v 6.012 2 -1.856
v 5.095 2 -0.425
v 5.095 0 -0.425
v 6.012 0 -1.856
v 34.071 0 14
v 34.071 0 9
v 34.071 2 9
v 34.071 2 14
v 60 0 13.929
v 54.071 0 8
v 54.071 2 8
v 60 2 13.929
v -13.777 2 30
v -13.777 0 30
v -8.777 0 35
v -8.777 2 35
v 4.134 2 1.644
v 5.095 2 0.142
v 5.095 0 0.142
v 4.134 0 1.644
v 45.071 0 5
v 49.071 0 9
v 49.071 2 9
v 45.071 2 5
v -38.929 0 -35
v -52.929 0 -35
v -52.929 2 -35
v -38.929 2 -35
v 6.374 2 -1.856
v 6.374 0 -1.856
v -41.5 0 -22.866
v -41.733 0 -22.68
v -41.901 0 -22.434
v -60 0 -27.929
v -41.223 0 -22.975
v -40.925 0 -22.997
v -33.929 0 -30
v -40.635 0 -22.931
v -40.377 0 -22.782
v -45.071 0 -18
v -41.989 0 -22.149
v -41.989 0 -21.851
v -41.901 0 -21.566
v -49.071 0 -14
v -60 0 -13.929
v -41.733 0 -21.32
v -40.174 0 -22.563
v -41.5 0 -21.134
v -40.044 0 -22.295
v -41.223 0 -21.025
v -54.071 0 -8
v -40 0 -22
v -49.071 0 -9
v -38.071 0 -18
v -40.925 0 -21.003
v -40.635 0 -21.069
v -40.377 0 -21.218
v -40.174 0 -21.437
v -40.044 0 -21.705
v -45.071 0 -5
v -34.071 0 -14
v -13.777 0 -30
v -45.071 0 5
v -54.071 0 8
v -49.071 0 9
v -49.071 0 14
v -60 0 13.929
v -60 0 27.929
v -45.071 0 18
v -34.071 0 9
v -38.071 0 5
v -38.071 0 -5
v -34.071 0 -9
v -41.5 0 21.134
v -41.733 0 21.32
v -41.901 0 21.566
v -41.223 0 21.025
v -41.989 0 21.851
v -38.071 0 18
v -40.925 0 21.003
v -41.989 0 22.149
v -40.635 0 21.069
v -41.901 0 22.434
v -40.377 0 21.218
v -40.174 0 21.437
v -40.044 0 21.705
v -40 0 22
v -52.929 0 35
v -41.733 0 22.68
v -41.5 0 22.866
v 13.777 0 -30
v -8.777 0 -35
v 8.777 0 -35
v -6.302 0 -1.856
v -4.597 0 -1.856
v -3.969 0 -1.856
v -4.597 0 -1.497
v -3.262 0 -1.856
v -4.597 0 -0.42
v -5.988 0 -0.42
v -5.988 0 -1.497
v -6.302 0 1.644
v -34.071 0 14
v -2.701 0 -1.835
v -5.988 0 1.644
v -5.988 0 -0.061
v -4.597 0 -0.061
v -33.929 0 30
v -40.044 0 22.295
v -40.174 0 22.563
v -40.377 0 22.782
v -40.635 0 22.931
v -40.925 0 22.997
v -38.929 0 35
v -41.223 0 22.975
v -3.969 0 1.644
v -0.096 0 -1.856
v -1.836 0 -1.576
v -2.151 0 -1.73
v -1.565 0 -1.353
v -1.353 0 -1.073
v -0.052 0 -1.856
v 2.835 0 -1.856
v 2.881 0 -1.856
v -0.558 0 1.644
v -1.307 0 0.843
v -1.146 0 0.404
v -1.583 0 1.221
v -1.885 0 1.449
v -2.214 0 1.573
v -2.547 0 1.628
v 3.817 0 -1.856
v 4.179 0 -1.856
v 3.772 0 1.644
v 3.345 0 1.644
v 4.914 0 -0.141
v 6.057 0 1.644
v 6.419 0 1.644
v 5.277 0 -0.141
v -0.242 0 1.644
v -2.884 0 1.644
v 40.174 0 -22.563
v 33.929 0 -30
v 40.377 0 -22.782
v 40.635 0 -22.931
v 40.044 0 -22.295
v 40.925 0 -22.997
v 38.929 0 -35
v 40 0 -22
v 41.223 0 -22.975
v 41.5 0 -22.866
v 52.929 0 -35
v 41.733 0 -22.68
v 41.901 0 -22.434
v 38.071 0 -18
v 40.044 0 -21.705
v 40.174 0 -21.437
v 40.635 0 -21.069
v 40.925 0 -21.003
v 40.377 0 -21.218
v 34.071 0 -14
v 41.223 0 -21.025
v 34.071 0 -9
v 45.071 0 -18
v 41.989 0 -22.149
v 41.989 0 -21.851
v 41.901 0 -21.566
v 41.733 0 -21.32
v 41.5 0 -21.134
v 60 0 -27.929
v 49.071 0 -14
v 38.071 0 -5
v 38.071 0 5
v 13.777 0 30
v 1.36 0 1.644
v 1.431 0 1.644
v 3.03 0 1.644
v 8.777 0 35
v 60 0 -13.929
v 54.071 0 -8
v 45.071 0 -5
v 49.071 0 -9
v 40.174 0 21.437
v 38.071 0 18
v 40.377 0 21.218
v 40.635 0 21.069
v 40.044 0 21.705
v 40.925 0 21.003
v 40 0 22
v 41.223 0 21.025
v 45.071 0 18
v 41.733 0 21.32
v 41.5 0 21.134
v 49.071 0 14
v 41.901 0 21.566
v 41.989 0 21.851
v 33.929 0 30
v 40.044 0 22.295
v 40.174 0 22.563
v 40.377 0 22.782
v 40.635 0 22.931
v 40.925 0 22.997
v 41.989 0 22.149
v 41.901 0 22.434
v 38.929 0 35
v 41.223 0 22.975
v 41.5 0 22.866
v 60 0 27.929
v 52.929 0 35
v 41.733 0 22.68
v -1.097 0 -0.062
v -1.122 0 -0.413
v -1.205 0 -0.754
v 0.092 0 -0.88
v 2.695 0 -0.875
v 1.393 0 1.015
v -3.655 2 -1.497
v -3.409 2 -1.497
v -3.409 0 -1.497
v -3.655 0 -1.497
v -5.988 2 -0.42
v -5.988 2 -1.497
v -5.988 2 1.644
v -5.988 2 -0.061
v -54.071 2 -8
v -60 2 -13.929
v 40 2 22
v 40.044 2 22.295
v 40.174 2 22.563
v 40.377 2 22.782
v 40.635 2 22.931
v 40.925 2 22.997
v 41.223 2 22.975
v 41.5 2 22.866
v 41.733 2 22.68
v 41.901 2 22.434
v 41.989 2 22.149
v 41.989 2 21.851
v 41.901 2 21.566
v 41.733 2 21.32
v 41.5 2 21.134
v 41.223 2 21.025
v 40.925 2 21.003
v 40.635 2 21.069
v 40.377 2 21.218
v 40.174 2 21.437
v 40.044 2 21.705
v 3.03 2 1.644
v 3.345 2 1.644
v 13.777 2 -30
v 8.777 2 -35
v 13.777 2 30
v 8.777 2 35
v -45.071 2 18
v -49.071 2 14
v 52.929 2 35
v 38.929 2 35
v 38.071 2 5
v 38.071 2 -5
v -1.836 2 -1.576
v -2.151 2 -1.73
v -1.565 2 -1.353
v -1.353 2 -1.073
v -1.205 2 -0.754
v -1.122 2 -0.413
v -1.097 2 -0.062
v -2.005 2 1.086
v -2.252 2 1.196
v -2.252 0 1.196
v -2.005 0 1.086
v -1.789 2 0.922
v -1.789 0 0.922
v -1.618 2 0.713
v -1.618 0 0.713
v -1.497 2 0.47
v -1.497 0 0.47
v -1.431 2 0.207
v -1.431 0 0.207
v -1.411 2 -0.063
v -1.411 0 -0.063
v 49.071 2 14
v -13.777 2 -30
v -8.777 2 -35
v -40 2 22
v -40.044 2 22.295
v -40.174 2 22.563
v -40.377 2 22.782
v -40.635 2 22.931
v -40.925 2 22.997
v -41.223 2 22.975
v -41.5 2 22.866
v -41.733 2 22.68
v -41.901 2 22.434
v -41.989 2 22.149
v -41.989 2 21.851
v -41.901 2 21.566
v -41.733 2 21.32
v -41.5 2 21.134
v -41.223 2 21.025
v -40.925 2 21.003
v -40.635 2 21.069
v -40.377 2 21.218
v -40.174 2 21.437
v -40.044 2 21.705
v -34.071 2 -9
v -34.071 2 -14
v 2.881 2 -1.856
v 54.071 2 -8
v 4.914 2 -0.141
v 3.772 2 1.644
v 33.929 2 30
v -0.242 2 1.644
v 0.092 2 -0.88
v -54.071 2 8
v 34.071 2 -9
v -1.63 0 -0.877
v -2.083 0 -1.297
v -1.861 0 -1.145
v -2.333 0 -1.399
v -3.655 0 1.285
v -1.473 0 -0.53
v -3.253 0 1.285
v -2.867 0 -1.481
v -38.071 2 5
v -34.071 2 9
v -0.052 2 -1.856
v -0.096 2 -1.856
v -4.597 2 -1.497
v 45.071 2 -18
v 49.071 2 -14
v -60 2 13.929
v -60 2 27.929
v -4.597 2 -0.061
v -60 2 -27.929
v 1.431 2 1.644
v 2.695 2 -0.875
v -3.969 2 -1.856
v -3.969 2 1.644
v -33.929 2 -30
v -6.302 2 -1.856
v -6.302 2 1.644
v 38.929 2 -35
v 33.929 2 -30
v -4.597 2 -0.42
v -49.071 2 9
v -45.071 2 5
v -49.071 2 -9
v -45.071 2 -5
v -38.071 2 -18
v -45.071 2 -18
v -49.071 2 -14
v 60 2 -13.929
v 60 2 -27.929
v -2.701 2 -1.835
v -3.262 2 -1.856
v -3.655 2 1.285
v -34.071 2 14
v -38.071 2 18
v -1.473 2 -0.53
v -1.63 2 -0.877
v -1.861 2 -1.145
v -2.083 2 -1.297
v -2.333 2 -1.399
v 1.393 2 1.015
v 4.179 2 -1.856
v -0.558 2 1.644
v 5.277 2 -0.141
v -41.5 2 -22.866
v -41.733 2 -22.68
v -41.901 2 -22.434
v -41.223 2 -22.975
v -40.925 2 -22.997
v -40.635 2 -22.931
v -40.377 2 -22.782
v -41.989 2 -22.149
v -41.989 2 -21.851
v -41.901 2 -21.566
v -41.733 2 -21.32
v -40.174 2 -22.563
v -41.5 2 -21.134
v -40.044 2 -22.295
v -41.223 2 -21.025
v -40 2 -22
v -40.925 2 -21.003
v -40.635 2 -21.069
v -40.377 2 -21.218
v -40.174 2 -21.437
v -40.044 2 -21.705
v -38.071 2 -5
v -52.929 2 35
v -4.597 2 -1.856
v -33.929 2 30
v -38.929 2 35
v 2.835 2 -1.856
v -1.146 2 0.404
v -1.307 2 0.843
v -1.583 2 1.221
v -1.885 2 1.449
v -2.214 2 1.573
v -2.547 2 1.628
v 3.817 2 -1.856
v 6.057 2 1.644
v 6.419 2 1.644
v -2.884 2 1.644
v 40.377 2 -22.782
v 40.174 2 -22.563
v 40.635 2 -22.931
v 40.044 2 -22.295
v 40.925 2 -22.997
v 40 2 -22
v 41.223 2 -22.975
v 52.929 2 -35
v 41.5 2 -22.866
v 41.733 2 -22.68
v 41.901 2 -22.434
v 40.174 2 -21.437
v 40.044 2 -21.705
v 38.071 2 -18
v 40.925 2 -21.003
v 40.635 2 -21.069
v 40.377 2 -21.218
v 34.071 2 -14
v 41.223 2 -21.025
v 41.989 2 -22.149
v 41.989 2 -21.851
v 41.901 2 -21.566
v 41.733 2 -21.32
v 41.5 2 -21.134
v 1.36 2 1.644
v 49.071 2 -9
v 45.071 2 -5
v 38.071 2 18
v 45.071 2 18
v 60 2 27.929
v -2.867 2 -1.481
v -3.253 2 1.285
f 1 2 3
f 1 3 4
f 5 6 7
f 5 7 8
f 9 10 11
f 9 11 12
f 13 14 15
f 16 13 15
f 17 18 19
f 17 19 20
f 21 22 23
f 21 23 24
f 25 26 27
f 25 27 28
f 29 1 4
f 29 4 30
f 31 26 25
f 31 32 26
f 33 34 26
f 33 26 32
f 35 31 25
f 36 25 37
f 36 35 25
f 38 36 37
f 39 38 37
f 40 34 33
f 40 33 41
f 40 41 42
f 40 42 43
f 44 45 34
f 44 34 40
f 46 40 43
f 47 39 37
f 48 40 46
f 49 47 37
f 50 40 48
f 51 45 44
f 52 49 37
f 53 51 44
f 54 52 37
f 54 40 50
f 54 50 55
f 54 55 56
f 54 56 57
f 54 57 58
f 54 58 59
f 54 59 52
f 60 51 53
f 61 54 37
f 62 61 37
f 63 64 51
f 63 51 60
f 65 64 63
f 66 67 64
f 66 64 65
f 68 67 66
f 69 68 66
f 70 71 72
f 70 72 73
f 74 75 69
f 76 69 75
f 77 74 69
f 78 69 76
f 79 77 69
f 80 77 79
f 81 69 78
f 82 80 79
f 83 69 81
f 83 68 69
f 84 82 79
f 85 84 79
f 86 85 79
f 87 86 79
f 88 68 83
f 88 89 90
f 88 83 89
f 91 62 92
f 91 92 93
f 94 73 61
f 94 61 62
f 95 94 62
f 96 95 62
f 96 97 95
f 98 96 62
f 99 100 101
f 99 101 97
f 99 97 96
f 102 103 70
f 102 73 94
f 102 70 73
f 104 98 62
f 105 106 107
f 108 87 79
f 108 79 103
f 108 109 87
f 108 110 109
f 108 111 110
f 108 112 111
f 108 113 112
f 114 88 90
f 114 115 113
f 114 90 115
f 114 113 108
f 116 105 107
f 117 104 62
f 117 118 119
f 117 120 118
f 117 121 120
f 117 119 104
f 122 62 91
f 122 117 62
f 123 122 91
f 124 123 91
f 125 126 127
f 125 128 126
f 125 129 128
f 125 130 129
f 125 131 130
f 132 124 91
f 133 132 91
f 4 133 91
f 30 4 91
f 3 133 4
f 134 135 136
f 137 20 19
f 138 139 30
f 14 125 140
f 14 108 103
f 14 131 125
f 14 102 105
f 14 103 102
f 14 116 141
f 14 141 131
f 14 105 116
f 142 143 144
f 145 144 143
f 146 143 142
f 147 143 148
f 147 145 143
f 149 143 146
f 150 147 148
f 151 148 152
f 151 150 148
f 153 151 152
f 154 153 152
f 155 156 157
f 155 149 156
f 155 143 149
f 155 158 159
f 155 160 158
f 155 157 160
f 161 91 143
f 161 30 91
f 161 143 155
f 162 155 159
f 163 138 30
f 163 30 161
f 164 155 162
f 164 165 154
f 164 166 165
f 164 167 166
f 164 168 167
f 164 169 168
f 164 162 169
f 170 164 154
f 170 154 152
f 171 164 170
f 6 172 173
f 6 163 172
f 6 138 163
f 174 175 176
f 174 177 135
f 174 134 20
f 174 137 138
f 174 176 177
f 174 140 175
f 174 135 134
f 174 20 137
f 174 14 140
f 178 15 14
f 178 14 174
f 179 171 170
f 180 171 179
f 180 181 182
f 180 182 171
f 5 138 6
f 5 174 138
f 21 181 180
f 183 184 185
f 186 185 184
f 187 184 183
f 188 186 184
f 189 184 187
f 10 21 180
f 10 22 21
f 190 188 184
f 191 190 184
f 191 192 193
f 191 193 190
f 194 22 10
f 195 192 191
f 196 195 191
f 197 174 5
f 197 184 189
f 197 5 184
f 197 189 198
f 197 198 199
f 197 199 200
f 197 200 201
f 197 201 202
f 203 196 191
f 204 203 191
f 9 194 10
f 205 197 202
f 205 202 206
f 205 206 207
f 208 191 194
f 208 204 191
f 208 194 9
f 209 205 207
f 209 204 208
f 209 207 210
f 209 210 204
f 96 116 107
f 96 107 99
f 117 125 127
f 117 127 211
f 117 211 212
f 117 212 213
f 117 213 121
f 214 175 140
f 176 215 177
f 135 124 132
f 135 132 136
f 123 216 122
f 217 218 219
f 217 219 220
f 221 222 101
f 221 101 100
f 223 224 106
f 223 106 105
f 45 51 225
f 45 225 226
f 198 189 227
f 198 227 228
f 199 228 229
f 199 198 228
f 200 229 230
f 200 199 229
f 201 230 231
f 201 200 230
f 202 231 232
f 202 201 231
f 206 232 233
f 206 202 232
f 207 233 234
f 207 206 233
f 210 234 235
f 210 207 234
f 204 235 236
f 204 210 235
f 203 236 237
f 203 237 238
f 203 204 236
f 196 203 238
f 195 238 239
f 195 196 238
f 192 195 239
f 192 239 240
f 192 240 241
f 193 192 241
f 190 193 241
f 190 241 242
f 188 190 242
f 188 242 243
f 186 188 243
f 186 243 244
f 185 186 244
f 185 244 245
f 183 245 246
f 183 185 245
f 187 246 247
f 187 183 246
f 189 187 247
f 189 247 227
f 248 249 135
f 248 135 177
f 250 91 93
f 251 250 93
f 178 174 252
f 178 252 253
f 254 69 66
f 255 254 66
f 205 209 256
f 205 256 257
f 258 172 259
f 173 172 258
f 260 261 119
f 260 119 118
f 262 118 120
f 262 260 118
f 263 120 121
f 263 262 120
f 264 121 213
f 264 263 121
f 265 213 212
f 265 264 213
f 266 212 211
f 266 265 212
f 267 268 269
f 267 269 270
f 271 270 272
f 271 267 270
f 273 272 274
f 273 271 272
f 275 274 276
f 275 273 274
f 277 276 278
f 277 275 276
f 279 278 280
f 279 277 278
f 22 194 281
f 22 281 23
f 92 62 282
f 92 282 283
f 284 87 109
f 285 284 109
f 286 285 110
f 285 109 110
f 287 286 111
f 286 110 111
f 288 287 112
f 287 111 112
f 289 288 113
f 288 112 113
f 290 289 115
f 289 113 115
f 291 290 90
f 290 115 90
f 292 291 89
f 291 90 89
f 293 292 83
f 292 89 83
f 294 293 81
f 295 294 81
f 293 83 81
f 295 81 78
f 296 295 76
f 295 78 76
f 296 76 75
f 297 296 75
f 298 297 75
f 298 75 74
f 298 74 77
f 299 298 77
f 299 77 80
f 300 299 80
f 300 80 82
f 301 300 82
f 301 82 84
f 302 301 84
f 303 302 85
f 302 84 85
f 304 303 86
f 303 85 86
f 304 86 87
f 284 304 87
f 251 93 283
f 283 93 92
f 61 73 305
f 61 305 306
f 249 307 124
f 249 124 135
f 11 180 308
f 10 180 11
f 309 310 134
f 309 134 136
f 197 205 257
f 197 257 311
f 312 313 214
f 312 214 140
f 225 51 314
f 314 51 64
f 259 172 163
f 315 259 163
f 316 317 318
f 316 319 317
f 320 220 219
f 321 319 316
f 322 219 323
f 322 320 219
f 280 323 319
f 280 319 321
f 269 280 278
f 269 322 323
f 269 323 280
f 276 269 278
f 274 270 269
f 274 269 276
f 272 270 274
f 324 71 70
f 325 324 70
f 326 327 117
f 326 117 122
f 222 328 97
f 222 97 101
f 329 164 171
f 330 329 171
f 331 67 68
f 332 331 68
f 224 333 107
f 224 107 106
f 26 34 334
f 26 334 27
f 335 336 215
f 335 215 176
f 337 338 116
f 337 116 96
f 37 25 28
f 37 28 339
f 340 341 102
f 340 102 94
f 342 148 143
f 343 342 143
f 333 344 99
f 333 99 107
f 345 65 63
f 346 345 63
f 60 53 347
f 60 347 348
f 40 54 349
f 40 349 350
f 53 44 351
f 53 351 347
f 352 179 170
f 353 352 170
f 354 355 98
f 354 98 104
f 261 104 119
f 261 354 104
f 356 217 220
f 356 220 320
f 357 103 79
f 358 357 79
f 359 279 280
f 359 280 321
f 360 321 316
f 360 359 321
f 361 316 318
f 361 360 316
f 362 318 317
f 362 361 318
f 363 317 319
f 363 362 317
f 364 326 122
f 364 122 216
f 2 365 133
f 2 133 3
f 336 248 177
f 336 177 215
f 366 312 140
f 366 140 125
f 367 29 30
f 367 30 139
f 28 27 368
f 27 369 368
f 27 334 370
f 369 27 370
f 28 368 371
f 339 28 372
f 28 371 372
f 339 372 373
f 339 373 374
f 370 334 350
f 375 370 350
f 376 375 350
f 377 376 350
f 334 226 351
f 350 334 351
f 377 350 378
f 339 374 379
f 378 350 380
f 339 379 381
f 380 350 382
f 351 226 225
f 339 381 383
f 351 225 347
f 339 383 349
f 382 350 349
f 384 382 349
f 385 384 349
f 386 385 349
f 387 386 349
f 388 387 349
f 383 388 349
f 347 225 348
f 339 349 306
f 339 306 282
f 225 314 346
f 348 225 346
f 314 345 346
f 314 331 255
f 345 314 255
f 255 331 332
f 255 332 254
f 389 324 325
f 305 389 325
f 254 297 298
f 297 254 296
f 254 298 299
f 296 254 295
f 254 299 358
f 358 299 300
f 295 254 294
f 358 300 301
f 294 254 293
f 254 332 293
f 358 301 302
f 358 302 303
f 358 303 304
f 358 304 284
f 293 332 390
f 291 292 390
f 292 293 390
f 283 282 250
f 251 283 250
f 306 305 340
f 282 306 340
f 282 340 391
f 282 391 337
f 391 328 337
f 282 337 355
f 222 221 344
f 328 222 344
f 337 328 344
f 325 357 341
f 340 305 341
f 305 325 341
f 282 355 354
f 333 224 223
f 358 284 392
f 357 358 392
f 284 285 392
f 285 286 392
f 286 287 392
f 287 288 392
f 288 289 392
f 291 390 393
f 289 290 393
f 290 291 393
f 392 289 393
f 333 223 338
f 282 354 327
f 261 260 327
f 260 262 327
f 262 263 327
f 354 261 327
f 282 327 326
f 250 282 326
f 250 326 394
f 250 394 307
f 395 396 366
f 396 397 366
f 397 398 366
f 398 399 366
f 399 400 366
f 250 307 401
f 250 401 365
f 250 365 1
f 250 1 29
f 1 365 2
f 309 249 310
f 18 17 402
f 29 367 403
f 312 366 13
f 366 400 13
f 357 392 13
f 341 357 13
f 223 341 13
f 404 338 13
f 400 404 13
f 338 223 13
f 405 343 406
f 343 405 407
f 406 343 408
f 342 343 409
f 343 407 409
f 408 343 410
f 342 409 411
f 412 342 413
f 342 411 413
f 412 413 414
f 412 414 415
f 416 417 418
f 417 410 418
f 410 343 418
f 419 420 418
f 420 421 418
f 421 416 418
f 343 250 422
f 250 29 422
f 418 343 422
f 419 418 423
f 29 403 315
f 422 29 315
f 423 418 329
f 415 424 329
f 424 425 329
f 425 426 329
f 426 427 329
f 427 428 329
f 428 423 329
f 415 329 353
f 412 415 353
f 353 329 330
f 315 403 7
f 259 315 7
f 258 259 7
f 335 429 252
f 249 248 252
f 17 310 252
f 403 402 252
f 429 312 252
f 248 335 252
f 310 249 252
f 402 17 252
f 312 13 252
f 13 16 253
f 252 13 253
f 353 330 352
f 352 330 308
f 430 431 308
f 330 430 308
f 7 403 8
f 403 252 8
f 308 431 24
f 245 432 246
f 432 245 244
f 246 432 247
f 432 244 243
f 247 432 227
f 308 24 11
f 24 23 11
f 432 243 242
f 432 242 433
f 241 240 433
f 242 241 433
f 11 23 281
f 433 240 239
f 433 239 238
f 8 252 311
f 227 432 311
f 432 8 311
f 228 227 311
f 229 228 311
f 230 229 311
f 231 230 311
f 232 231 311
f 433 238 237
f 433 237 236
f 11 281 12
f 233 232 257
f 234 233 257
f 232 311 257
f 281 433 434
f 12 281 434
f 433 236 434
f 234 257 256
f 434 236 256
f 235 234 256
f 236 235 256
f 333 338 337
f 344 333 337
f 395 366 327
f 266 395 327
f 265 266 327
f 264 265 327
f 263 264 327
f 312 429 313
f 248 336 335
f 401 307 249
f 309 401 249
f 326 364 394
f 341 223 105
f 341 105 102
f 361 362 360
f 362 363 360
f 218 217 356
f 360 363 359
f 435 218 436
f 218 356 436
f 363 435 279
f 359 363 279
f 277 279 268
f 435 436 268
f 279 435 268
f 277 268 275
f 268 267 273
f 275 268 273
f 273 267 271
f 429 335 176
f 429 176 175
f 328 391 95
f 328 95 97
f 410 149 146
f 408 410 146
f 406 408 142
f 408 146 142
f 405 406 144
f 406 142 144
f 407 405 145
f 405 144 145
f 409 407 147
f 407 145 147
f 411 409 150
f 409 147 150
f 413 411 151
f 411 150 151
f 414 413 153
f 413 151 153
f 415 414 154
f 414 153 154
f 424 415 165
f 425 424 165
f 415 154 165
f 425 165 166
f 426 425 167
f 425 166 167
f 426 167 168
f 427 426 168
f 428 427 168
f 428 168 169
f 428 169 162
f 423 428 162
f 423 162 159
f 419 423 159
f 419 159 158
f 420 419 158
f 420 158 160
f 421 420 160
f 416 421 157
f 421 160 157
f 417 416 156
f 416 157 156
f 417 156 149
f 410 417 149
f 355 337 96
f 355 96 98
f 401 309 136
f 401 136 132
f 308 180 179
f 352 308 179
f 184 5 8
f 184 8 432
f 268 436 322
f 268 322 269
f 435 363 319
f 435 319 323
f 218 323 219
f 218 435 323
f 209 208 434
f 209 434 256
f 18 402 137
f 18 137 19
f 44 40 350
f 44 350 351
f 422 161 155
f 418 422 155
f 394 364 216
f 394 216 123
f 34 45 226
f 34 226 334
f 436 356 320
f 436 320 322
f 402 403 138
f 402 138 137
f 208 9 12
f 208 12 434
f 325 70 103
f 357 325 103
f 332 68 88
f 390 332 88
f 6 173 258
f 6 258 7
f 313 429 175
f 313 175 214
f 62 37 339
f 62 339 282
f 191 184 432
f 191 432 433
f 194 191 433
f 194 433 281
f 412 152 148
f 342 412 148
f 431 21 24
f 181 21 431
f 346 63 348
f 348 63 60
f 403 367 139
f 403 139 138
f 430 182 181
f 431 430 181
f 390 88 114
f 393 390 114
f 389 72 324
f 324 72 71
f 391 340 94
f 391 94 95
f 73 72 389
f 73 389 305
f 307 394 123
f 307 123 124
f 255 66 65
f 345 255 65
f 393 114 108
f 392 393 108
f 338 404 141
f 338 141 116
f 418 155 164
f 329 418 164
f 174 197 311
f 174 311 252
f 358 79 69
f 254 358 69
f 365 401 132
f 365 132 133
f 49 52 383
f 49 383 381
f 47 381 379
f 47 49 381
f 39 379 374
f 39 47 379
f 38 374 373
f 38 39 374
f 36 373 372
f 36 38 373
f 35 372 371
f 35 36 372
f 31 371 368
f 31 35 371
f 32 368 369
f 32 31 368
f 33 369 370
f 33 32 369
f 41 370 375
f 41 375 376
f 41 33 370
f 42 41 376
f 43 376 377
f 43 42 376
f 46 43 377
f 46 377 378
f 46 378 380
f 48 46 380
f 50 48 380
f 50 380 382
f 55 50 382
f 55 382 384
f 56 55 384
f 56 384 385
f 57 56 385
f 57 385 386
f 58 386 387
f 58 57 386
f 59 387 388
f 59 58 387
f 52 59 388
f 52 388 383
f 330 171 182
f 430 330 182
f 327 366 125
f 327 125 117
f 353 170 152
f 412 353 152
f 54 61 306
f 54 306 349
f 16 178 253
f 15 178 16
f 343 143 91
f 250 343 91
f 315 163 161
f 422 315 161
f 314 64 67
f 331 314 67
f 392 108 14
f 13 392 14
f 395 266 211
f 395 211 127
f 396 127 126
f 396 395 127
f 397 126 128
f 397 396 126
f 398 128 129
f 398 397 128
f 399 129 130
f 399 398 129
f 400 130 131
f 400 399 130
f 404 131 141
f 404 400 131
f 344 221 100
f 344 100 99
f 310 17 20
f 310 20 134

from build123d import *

# Parameters (mm, degrees)
SKETCH1_R                                  = 1
BOSS_EXTRUDE1_DEPTH                        = 2
MIRROR1_AT_THE_SECOND_PLANE_COPY_1_SKETC_R = 1
MIRROR1_AT_THE_SECOND_PLANE_COPY_1_DEPTH   = 2
CUT_EXTRUDE2_DEPTH                         = 2


with BuildPart() as part:
    # Sketch1 → Boss-Extrude1 (new body)
    with BuildSketch(Plane(origin=(0, 0, 0), x_dir=(1, 0, 0), z_dir=(0, 1, 0))):
        Polygon((0, 0), (-38.071067812, 0), (-38.071067812, 5), (-34.071067812, 9), (-34.071067812, 14), (-38.071067812, 18), (-45.071067812, 18), (-49.071067812, 14), (-49.071067812, 9), (-45.071067812, 5), (-45.071067812, 0), (-54.071067812, 0), (-54.071067812, 8), (-60, 13.928932188), (-60, 27.928932188), (-52.928932188, 35), (-38.928932188, 35), (-33.928932188, 30), (-13.776910945, 30), (-8.776910945, 35), (0, 35), align=None)
        with Locations((-41, 22)):
            Circle(SKETCH1_R, mode=Mode.SUBTRACT)
    boss_extrude1 = extrude(amount=BOSS_EXTRUDE1_DEPTH)



with BuildPart() as mirror1_1:
    # Mirror1: Boss-Extrude1 across plane
    add(boss_extrude1.mirror(Plane(origin=(0, 0, 0), x_dir=(0, 0, 1), z_dir=(1, 0, 0))))


with BuildPart() as part_1:
    add(part.part)

    add(mirror1_1.part)  # Mirror1 at the second plane merges Mirror1_1
    # Mirror1 at the second plane: Boss-Extrude1 across plane
    add(boss_extrude1.mirror(Plane.XY))

    # Mirror1 at the second plane copy 1 sketc → Mirror1 at the second plane copy 1 (add)
    with BuildSketch(Plane(origin=(0, 0, 0), x_dir=(-1, 0, 0), z_dir=(0, 1, 0))):
        Polygon((0, 0), (-38.071067812, 0), (-38.071067812, 5), (-34.071067812, 9), (-34.071067812, 14), (-38.071067812, 18), (-45.071067812, 18), (-49.071067812, 14), (-49.071067812, 9), (-45.071067812, 5), (-45.071067812, 0), (-54.071067812, 0), (-54.071067812, 8), (-60, 13.928932188), (-60, 27.928932188), (-52.928932188, 35), (-38.928932188, 35), (-33.928932188, 30), (-13.776910945, 30), (-8.776910945, 35), (0, 35), align=None)
        with Locations((-41, 22)):
            Circle(MIRROR1_AT_THE_SECOND_PLANE_COPY_1_SKETC_R, mode=Mode.SUBTRACT)
    extrude(amount=MIRROR1_AT_THE_SECOND_PLANE_COPY_1_DEPTH)

    # Sketch3 → Cut-Extrude2 (cut)
    with BuildSketch(Plane(origin=(0, 2, 0), x_dir=(1, 0, 0), z_dir=(0, 1, 0))):
        Polygon((-6.30208654, 1.856340481), (-4.596958334, 1.856340481), (-4.596958334, 1.497366122), (-5.987983975, 1.497366122), (-5.987983975, 0.420443045), (-4.596958334, 0.420443045), (-4.596958334, 0.061468686), (-5.987983975, 0.061468686), (-5.987983975, -1.643659519), (-6.30208654, -1.643659519), align=None)
        with BuildLine():
            Line((-3.968753206, -1.643659519), (-3.968753206, 1.856340481))
            Line((-3.968753206, 1.856340481), (-3.262022437, 1.856340481))
            add(Edge.make_bspline(
                [(-3.262022437, 1.856340481), (-3.200553449, 1.855897911), (-3.081795683, 1.855042868), (-2.910183236, 1.849621477), (-2.751399474, 1.840031011), (-2.605966614, 1.826061485), (-2.473485402, 1.808908451), (-2.354326794, 1.787408047), (-2.247874651, 1.762019877), (-2.182405211, 1.740374426), (-2.151445514, 1.730138558)],
                knots=[0, 0, 0, 0, 0.000184407, 0.000356273, 0.000515031, 0.000661537, 0.000794508, 0.000915664, 0.001024665, 0.001122454, 0.001122454, 0.001122454, 0.001122454], degree=3))
            add(Edge.make_bspline(
                [(-2.151445514, 1.730138558), (-2.110950775, 1.714707852), (-2.030879582, 1.684196358), (-1.91687246, 1.626640057), (-1.809547097, 1.561426955), (-1.708327952, 1.488471092), (-1.615527125, 1.405706744), (-1.527519229, 1.316649658), (-1.447904505, 1.218061318), (-1.374996209, 1.11198633), (-1.309260549, 0.999674278), (-1.252121392, 0.881339169), (-1.204667398, 0.757581961), (-1.165274172, 0.628746813), (-1.134227714, 0.494550435), (-1.113045782, 0.354836569), (-1.099074793, 0.21015738), (-1.097670741, 0.111982916), (-1.096958334, 0.062169808)],
                knots=[0, 0, 0, 0, 0.000129935, 0.000256923, 0.000382457, 0.000506429, 0.000630624, 0.000755071, 0.000881654, 0.001010204, 0.001140916, 0.00127168, 0.001403968, 0.001538146, 0.001675568, 0.001816774, 0.001961818, 0.002111216, 0.002111216, 0.002111216, 0.002111216], degree=3))
            add(Edge.make_bspline(
                [(-1.096958334, 0.062169808), (-1.097587302, 0.018908569), (-1.098826748, -0.06634222), (-1.109956064, -0.191983115), (-1.126132384, -0.313896687), (-1.151176582, -0.431502387), (-1.181579095, -0.545830604), (-1.220543246, -0.655662849), (-1.265178743, -0.762006658), (-1.317228621, -0.863424134), (-1.374370006, -0.959507506), (-1.435691749, -1.050083035), (-1.501128445, -1.133858256), (-1.571304078, -1.211086868), (-1.645311794, -1.281652447), (-1.723636125, -1.346144462), (-1.806479176, -1.403301017), (-1.893469898, -1.455368125), (-1.987146027, -1.500788481), (-2.089281894, -1.53921849), (-2.200313072, -1.571065106), (-2.319967029, -1.597636002), (-2.448450506, -1.618713304), (-2.585889472, -1.632839697), (-2.732072762, -1.642392629), (-2.832452027, -1.643229023), (-2.88411779, -1.643659519)],
                knots=[0, 0, 0, 0, 0.000129755, 0.000255696, 0.000378151, 0.000498469, 0.000616165, 0.000732801, 0.000847787, 0.000961923, 0.00107447, 0.001182981, 0.001289856, 0.001393094, 0.001495748, 0.001596383, 0.00169713, 0.001797413, 0.001900265, 0.002008995, 0.002124372, 0.002246504, 0.002376522, 0.002514729, 0.002660846, 0.00281582, 0.00281582, 0.00281582, 0.00281582], degree=3))
            Line((-2.88411779, -1.643659519), (-3.968753206, -1.643659519))
        make_face()
        with BuildLine():
            Line((-3.654650642, -1.28468516), (-3.252907854, -1.28468516))
            add(Edge.make_bspline(
                [(-3.252907854, -1.28468516), (-3.195179483, -1.284437064), (-3.084146684, -1.283959884), (-2.924488687, -1.27977268), (-2.778609291, -1.272930743), (-2.646487781, -1.263355665), (-2.528198757, -1.25068705), (-2.423495007, -1.236562147), (-2.332719749, -1.218964696), (-2.277790312, -1.203013737), (-2.252407052, -1.195642692)],
                knots=[0, 0, 0, 0, 0.000173183, 0.000333094, 0.000479096, 0.000611272, 0.000730431, 0.000835931, 0.000928194, 0.001007458, 0.001007458, 0.001007458, 0.001007458], degree=3))
            add(Edge.make_bspline(
                [(-2.252407052, -1.195642692), (-2.22045869, -1.184391134), (-2.157325052, -1.162156761), (-2.066443967, -1.121599099), (-1.981686962, -1.07355703), (-1.901576937, -1.020154756), (-1.827250282, -0.959508754), (-1.757826165, -0.892937765), (-1.693444364, -0.82010299), (-1.634770056, -0.741094828), (-1.582261752, -0.656405033), (-1.536790522, -0.566866199), (-1.496938991, -0.473459389), (-1.465660398, -0.37475023), (-1.441144814, -0.271621172), (-1.423780126, -0.164064958), (-1.412965402, -0.052101677), (-1.411703954, 0.024050448), (-1.411060898, 0.06287093)],
                knots=[0, 0, 0, 0, 0.000101593, 0.000200759, 0.000298073, 0.000393552, 0.000489254, 0.000585454, 0.000681817, 0.000780535, 0.000880346, 0.000980374, 0.001081551, 0.001184655, 0.001290601, 0.001399295, 0.001511268, 0.001627707, 0.001627707, 0.001627707, 0.001627707], degree=3))
            add(Edge.make_bspline(
                [(-1.411060898, 0.06287093), (-1.411574186, 0.10380441), (-1.412582543, 0.184218594), (-1.425256854, 0.30220929), (-1.443778409, 0.41568994), (-1.470562095, 0.524668136), (-1.504692974, 0.629356488), (-1.547287616, 0.729175998), (-1.595954235, 0.825180867), (-1.653857572, 0.915155232), (-1.717273165, 1.000248342), (-1.787651045, 1.078203257), (-1.863873083, 1.149197557), (-1.945107933, 1.21433687), (-2.033645032, 1.271000546), (-2.127398723, 1.321687227), (-2.227744394, 1.364703118), (-2.29755709, 1.387581981), (-2.333036059, 1.399209071)],
                knots=[0, 0, 0, 0, 0.000122746, 0.000241136, 0.000355593, 0.000467485, 0.000577457, 0.000685538, 0.00079278, 0.000899951, 0.001006101, 0.00111085, 0.001214524, 0.001318328, 0.001422759, 0.001529413, 0.00163777, 0.001749741, 0.001749741, 0.001749741, 0.001749741], degree=3))
            add(Edge.make_bspline(
                [(-2.333036059, 1.399209071), (-2.362387205, 1.407325499), (-2.424795795, 1.424583251), (-2.526635259, 1.443408624), (-2.641250409, 1.460013123), (-2.76915011, 1.474071162), (-2.910188569, 1.484158483), (-3.064474257, 1.491729798), (-3.232073862, 1.49683643), (-3.348256395, 1.497185138), (-3.408556892, 1.497366122)],
                knots=[0, 0, 0, 0, 9.1321e-05, 0.000194173, 0.000310382, 0.000438754, 0.000580072, 0.000734511, 0.000902151, 0.001083046, 0.001083046, 0.001083046, 0.001083046], degree=3))
            Line((-3.408556892, 1.497366122), (-3.654650642, 1.497366122))
            Line((-3.654650642, 1.497366122), (-3.654650642, -1.28468516))
        make_face(mode=Mode.SUBTRACT)
        Polygon((-0.558496796, -1.643659519), (-0.096457533, 1.856340481), (-0.051585738, 1.856340481), (1.393426281, -1.015454391), (2.834932691, 1.856340481), (2.880505608, 1.856340481), (3.345349358, -1.643659519), (3.02984455, -1.643659519), (2.694708332, 0.874769968), (1.431286858, -1.643659519), (1.360473557, -1.643659519), (0.09214423, 0.880378942), (-0.242290866, -1.643659519), align=None)
        Polygon((3.816503204, 1.856340481), (4.178983172, 1.856340481), (5.095349358, 0.424649776), (6.011715544, 1.856340481), (6.374195512, 1.856340481), (5.276939903, 0.141396571), (6.419067307, -1.643659519), (6.056587339, -1.643659519), (5.095349358, -0.141856634), (4.134111377, -1.643659519), (3.771631409, -1.643659519), (4.914459935, 0.141396571), align=None)
    extrude(amount=-CUT_EXTRUDE2_DEPTH, mode=Mode.SUBTRACT)


solid = part_1.part
